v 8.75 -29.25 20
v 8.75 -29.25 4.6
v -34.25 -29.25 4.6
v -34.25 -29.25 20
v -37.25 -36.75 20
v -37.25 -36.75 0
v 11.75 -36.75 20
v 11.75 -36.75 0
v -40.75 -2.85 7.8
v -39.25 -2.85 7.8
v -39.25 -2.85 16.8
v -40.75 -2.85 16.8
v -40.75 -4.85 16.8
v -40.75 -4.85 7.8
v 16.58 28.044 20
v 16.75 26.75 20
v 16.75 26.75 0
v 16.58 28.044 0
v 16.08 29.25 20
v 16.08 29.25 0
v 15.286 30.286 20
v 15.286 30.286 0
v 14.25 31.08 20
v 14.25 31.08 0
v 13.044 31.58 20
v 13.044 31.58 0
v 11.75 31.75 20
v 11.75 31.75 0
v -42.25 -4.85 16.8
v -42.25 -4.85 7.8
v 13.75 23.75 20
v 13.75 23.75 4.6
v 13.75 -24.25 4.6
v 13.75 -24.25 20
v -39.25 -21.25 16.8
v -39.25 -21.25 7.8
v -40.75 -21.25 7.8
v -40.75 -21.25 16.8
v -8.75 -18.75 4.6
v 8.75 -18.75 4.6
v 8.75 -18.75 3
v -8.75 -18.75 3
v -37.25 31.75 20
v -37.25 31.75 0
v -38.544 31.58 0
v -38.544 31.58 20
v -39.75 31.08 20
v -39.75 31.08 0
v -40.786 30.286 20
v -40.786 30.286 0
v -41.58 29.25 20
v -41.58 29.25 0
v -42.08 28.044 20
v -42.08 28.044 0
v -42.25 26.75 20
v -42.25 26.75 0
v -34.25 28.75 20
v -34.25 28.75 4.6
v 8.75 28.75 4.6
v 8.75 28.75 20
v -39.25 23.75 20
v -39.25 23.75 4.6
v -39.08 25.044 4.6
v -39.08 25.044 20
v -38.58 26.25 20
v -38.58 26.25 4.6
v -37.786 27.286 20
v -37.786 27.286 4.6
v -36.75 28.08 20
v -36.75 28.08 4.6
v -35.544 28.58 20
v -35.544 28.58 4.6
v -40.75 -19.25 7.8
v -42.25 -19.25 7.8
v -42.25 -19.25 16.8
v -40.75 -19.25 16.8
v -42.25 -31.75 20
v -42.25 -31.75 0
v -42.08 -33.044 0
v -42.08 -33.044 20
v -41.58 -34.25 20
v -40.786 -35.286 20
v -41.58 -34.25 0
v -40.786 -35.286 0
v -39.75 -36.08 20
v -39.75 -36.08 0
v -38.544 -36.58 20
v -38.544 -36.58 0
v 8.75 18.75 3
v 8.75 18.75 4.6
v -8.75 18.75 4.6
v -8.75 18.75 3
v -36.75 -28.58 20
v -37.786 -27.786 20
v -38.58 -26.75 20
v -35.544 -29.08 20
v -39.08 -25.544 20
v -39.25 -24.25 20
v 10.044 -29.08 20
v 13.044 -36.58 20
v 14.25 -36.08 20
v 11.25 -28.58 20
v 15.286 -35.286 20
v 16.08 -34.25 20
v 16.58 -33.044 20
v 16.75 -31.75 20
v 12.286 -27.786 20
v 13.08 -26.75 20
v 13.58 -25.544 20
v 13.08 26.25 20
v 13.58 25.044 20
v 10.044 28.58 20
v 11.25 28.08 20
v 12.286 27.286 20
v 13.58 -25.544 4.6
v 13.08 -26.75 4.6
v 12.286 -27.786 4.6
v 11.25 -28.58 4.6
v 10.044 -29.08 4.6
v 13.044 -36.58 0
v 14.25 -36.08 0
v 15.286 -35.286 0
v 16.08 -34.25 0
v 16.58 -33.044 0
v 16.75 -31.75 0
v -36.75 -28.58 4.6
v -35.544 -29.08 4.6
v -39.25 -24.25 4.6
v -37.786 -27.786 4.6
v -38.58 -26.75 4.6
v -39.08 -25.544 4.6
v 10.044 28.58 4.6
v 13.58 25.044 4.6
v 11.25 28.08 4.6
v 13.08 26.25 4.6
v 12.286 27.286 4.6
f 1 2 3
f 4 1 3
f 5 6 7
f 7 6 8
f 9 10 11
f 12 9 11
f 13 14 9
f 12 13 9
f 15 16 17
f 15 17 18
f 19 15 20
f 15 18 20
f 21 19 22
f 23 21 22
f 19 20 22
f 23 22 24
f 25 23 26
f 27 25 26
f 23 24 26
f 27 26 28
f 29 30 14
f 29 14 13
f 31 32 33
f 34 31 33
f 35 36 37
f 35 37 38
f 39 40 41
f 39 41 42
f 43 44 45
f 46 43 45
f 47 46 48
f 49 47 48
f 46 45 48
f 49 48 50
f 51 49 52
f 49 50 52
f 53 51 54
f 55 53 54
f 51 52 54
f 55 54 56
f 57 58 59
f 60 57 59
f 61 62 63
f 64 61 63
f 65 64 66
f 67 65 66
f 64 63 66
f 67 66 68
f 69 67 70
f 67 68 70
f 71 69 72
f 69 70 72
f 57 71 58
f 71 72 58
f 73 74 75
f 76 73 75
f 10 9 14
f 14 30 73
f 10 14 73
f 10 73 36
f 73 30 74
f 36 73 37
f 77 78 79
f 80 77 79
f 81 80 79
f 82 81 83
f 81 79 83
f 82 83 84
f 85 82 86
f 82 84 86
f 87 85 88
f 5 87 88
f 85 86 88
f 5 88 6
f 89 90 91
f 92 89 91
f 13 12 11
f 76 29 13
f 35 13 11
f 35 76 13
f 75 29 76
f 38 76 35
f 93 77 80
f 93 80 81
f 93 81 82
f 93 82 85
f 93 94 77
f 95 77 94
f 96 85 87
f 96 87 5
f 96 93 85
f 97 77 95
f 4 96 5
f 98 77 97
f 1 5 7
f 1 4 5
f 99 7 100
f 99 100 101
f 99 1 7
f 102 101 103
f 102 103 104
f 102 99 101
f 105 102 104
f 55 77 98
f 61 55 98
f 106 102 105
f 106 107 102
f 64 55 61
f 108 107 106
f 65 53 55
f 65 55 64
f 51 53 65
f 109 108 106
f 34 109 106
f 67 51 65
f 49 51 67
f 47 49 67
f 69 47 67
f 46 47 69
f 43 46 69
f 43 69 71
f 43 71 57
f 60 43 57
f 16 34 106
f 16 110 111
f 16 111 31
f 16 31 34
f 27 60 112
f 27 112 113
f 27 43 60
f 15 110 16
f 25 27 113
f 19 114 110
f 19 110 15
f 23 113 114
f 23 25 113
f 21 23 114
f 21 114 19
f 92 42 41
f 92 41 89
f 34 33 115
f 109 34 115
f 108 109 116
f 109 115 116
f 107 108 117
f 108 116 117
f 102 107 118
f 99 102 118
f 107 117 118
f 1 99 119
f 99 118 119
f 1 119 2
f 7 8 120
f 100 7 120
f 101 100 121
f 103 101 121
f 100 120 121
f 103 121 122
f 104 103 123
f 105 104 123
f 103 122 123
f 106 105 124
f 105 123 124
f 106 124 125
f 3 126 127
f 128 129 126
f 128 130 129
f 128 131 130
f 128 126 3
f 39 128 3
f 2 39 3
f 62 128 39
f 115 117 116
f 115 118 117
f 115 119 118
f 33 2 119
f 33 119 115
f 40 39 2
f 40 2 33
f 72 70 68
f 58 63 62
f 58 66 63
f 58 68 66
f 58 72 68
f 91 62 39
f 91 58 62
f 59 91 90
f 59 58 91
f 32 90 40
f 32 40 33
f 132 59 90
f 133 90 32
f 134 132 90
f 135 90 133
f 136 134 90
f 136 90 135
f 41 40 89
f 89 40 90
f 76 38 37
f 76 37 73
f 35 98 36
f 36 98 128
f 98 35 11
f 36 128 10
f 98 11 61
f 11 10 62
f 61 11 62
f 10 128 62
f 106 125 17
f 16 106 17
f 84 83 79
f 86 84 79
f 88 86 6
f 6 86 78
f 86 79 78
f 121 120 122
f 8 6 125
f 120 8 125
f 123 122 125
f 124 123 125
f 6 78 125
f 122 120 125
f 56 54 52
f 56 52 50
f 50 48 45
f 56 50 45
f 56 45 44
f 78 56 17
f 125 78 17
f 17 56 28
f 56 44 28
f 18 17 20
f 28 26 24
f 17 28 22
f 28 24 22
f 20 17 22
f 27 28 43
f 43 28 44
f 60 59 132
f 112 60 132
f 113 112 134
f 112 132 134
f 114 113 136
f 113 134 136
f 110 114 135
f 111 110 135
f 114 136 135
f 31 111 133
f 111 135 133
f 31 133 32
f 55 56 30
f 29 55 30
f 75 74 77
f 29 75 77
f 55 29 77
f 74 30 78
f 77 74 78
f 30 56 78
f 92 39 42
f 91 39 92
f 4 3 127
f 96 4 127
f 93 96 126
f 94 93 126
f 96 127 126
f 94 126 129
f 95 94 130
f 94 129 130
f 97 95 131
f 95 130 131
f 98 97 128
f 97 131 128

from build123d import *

# Parameters (mm, degrees)
F0_W      = 47.5
F0_H      = 27.5
F0_W_2    = 37.5
F0_H_2    = 17.5
F1_DEPTH  = 4.6
F2_DEPTH  = 1.6
F7_ANGLE  = 90
F8_W      = 17.5
F8_H      = 37.5
F9_DEPTH  = 4.6
F10_DEPTH = 20
F11_W     = 14.4
F11_H     = 9
F12_DEPTH = 3
F13_W     = 2
F13_H     = 9
F14_DEPTH = 1.5


with BuildPart() as f1:
    # F0 (on Top) → F1 (new body)
    with BuildSketch(Plane.XY):
        Rectangle(F0_W, F0_H)
        Rectangle(F0_W_2, F0_H_2, mode=Mode.SUBTRACT)
        Rectangle(F0_W_2, F0_H_2)
    extrude(amount=F1_DEPTH)

    # F0 (on Top) → F2 (cut)
    with BuildSketch(Plane.XY):
        Rectangle(F0_W_2, F0_H_2)
    extrude(amount=F2_DEPTH, mode=Mode.SUBTRACT)


with BuildPart() as f4_1:
    # F4: instance of F1
    add(f1.part.mirror(Plane.XY.offset(2.3)))


with BuildPart() as f4_1_1:
    # F7: moved
    add(f4_1.part.rotate(Axis((0, 0, 16.2241663784), (0, 0, 1)), F7_ANGLE))

    # F8 (on Top) → F9 (join, through all)
    with BuildSketch(Plane.XY):
        with BuildLine():
            Line((11.75, 31.75), (-37.25, 31.75))
            ThreePointArc((-37.25, 31.75), (-40.7855339059, 30.2855339059), (-42.25, 26.75))
            Line((-42.25, 26.75), (-42.25, -31.75))
            ThreePointArc((-42.25, -31.75), (-40.7855339059, -35.2855339059), (-37.25, -36.75))
            Line((-37.25, -36.75), (11.75, -36.75))
            ThreePointArc((11.75, -36.75), (15.2855339059, -35.2855339059), (16.75, -31.75))
            Line((16.75, -31.75), (16.75, 26.75))
            ThreePointArc((16.75, 26.75), (15.2855339059, 30.2855339059), (11.75, 31.75))
        make_face()
        with BuildLine():
            ThreePointArc((-34.25, -29.25), (-37.7855339059, -27.7855339059), (-39.25, -24.25))
            Line((-39.25, -24.25), (-39.25, 23.75))
            ThreePointArc((-39.25, 23.75), (-37.7855339059, 27.2855339059), (-34.25, 28.75))
            Line((-34.25, 28.75), (8.75, 28.75))
            ThreePointArc((8.75, 28.75), (12.2855339059, 27.2855339059), (13.75, 23.75))
            Line((13.75, 23.75), (13.75, -24.25))
            ThreePointArc((13.75, -24.25), (12.2855339059, -27.7855339059), (8.75, -29.25))
            Line((8.75, -29.25), (-34.25, -29.25))
        make_face(mode=Mode.SUBTRACT)
        with BuildLine():
            Line((-39.25, 23.75), (-39.25, -24.25))
            ThreePointArc((-39.25, -24.25), (-37.7855339059, -27.7855339059), (-34.25, -29.25))
            Line((-34.25, -29.25), (8.75, -29.25))
            ThreePointArc((8.75, -29.25), (12.2855339059, -27.7855339059), (13.75, -24.25))
            Line((13.75, -24.25), (13.75, 23.75))
            ThreePointArc((13.75, 23.75), (12.2855339059, 27.2855339059), (8.75, 28.75))
            Line((8.75, 28.75), (-34.25, 28.75))
            ThreePointArc((-34.25, 28.75), (-37.7855339059, 27.2855339059), (-39.25, 23.75))
        make_face()
        Rectangle(F8_W, F8_H, mode=Mode.SUBTRACT)
    extrude(amount=F9_DEPTH)

    # F8 (on Top) → F10 (join)
    with BuildSketch(Plane.XY):
        with BuildLine():
            Line((11.75, 31.75), (-37.25, 31.75))
            ThreePointArc((-37.25, 31.75), (-40.7855339059, 30.2855339059), (-42.25, 26.75))
            Line((-42.25, 26.75), (-42.25, -31.75))
            ThreePointArc((-42.25, -31.75), (-40.7855339059, -35.2855339059), (-37.25, -36.75))
            Line((-37.25, -36.75), (11.75, -36.75))
            ThreePointArc((11.75, -36.75), (15.2855339059, -35.2855339059), (16.75, -31.75))
            Line((16.75, -31.75), (16.75, 26.75))
            ThreePointArc((16.75, 26.75), (15.2855339059, 30.2855339059), (11.75, 31.75))
        make_face()
        with BuildLine():
            ThreePointArc((-34.25, -29.25), (-37.7855339059, -27.7855339059), (-39.25, -24.25))
            Line((-39.25, -24.25), (-39.25, 23.75))
            ThreePointArc((-39.25, 23.75), (-37.7855339059, 27.2855339059), (-34.25, 28.75))
            Line((-34.25, 28.75), (8.75, 28.75))
            ThreePointArc((8.75, 28.75), (12.2855339059, 27.2855339059), (13.75, 23.75))
            Line((13.75, 23.75), (13.75, -24.25))
            ThreePointArc((13.75, -24.25), (12.2855339059, -27.7855339059), (8.75, -29.25))
            Line((8.75, -29.25), (-34.25, -29.25))
        make_face(mode=Mode.SUBTRACT)
    extrude(amount=F10_DEPTH)

    # F11 (on face) → F12 (cut, through all)
    with BuildSketch(Plane(origin=(-42.25, 0, 0), x_dir=(0, -1, 0), z_dir=(-1, 0, 0))):
        with Locations((12.05, 12.3)):
            Rectangle(F11_W, F11_H)
    extrude(amount=-F12_DEPTH, mode=Mode.SUBTRACT)

    # F13 (on face) → F14 (cut)
    with BuildSketch(Plane.YZ.offset(-39.25)):
        with Locations((-20.25, 12.3)):
            Rectangle(F13_W, F13_H)
        with Locations((-3.85, 12.3)):
            Rectangle(F13_W, F13_H)
    extrude(amount=-F14_DEPTH, mode=Mode.SUBTRACT)


solid = f4_1_1.part
